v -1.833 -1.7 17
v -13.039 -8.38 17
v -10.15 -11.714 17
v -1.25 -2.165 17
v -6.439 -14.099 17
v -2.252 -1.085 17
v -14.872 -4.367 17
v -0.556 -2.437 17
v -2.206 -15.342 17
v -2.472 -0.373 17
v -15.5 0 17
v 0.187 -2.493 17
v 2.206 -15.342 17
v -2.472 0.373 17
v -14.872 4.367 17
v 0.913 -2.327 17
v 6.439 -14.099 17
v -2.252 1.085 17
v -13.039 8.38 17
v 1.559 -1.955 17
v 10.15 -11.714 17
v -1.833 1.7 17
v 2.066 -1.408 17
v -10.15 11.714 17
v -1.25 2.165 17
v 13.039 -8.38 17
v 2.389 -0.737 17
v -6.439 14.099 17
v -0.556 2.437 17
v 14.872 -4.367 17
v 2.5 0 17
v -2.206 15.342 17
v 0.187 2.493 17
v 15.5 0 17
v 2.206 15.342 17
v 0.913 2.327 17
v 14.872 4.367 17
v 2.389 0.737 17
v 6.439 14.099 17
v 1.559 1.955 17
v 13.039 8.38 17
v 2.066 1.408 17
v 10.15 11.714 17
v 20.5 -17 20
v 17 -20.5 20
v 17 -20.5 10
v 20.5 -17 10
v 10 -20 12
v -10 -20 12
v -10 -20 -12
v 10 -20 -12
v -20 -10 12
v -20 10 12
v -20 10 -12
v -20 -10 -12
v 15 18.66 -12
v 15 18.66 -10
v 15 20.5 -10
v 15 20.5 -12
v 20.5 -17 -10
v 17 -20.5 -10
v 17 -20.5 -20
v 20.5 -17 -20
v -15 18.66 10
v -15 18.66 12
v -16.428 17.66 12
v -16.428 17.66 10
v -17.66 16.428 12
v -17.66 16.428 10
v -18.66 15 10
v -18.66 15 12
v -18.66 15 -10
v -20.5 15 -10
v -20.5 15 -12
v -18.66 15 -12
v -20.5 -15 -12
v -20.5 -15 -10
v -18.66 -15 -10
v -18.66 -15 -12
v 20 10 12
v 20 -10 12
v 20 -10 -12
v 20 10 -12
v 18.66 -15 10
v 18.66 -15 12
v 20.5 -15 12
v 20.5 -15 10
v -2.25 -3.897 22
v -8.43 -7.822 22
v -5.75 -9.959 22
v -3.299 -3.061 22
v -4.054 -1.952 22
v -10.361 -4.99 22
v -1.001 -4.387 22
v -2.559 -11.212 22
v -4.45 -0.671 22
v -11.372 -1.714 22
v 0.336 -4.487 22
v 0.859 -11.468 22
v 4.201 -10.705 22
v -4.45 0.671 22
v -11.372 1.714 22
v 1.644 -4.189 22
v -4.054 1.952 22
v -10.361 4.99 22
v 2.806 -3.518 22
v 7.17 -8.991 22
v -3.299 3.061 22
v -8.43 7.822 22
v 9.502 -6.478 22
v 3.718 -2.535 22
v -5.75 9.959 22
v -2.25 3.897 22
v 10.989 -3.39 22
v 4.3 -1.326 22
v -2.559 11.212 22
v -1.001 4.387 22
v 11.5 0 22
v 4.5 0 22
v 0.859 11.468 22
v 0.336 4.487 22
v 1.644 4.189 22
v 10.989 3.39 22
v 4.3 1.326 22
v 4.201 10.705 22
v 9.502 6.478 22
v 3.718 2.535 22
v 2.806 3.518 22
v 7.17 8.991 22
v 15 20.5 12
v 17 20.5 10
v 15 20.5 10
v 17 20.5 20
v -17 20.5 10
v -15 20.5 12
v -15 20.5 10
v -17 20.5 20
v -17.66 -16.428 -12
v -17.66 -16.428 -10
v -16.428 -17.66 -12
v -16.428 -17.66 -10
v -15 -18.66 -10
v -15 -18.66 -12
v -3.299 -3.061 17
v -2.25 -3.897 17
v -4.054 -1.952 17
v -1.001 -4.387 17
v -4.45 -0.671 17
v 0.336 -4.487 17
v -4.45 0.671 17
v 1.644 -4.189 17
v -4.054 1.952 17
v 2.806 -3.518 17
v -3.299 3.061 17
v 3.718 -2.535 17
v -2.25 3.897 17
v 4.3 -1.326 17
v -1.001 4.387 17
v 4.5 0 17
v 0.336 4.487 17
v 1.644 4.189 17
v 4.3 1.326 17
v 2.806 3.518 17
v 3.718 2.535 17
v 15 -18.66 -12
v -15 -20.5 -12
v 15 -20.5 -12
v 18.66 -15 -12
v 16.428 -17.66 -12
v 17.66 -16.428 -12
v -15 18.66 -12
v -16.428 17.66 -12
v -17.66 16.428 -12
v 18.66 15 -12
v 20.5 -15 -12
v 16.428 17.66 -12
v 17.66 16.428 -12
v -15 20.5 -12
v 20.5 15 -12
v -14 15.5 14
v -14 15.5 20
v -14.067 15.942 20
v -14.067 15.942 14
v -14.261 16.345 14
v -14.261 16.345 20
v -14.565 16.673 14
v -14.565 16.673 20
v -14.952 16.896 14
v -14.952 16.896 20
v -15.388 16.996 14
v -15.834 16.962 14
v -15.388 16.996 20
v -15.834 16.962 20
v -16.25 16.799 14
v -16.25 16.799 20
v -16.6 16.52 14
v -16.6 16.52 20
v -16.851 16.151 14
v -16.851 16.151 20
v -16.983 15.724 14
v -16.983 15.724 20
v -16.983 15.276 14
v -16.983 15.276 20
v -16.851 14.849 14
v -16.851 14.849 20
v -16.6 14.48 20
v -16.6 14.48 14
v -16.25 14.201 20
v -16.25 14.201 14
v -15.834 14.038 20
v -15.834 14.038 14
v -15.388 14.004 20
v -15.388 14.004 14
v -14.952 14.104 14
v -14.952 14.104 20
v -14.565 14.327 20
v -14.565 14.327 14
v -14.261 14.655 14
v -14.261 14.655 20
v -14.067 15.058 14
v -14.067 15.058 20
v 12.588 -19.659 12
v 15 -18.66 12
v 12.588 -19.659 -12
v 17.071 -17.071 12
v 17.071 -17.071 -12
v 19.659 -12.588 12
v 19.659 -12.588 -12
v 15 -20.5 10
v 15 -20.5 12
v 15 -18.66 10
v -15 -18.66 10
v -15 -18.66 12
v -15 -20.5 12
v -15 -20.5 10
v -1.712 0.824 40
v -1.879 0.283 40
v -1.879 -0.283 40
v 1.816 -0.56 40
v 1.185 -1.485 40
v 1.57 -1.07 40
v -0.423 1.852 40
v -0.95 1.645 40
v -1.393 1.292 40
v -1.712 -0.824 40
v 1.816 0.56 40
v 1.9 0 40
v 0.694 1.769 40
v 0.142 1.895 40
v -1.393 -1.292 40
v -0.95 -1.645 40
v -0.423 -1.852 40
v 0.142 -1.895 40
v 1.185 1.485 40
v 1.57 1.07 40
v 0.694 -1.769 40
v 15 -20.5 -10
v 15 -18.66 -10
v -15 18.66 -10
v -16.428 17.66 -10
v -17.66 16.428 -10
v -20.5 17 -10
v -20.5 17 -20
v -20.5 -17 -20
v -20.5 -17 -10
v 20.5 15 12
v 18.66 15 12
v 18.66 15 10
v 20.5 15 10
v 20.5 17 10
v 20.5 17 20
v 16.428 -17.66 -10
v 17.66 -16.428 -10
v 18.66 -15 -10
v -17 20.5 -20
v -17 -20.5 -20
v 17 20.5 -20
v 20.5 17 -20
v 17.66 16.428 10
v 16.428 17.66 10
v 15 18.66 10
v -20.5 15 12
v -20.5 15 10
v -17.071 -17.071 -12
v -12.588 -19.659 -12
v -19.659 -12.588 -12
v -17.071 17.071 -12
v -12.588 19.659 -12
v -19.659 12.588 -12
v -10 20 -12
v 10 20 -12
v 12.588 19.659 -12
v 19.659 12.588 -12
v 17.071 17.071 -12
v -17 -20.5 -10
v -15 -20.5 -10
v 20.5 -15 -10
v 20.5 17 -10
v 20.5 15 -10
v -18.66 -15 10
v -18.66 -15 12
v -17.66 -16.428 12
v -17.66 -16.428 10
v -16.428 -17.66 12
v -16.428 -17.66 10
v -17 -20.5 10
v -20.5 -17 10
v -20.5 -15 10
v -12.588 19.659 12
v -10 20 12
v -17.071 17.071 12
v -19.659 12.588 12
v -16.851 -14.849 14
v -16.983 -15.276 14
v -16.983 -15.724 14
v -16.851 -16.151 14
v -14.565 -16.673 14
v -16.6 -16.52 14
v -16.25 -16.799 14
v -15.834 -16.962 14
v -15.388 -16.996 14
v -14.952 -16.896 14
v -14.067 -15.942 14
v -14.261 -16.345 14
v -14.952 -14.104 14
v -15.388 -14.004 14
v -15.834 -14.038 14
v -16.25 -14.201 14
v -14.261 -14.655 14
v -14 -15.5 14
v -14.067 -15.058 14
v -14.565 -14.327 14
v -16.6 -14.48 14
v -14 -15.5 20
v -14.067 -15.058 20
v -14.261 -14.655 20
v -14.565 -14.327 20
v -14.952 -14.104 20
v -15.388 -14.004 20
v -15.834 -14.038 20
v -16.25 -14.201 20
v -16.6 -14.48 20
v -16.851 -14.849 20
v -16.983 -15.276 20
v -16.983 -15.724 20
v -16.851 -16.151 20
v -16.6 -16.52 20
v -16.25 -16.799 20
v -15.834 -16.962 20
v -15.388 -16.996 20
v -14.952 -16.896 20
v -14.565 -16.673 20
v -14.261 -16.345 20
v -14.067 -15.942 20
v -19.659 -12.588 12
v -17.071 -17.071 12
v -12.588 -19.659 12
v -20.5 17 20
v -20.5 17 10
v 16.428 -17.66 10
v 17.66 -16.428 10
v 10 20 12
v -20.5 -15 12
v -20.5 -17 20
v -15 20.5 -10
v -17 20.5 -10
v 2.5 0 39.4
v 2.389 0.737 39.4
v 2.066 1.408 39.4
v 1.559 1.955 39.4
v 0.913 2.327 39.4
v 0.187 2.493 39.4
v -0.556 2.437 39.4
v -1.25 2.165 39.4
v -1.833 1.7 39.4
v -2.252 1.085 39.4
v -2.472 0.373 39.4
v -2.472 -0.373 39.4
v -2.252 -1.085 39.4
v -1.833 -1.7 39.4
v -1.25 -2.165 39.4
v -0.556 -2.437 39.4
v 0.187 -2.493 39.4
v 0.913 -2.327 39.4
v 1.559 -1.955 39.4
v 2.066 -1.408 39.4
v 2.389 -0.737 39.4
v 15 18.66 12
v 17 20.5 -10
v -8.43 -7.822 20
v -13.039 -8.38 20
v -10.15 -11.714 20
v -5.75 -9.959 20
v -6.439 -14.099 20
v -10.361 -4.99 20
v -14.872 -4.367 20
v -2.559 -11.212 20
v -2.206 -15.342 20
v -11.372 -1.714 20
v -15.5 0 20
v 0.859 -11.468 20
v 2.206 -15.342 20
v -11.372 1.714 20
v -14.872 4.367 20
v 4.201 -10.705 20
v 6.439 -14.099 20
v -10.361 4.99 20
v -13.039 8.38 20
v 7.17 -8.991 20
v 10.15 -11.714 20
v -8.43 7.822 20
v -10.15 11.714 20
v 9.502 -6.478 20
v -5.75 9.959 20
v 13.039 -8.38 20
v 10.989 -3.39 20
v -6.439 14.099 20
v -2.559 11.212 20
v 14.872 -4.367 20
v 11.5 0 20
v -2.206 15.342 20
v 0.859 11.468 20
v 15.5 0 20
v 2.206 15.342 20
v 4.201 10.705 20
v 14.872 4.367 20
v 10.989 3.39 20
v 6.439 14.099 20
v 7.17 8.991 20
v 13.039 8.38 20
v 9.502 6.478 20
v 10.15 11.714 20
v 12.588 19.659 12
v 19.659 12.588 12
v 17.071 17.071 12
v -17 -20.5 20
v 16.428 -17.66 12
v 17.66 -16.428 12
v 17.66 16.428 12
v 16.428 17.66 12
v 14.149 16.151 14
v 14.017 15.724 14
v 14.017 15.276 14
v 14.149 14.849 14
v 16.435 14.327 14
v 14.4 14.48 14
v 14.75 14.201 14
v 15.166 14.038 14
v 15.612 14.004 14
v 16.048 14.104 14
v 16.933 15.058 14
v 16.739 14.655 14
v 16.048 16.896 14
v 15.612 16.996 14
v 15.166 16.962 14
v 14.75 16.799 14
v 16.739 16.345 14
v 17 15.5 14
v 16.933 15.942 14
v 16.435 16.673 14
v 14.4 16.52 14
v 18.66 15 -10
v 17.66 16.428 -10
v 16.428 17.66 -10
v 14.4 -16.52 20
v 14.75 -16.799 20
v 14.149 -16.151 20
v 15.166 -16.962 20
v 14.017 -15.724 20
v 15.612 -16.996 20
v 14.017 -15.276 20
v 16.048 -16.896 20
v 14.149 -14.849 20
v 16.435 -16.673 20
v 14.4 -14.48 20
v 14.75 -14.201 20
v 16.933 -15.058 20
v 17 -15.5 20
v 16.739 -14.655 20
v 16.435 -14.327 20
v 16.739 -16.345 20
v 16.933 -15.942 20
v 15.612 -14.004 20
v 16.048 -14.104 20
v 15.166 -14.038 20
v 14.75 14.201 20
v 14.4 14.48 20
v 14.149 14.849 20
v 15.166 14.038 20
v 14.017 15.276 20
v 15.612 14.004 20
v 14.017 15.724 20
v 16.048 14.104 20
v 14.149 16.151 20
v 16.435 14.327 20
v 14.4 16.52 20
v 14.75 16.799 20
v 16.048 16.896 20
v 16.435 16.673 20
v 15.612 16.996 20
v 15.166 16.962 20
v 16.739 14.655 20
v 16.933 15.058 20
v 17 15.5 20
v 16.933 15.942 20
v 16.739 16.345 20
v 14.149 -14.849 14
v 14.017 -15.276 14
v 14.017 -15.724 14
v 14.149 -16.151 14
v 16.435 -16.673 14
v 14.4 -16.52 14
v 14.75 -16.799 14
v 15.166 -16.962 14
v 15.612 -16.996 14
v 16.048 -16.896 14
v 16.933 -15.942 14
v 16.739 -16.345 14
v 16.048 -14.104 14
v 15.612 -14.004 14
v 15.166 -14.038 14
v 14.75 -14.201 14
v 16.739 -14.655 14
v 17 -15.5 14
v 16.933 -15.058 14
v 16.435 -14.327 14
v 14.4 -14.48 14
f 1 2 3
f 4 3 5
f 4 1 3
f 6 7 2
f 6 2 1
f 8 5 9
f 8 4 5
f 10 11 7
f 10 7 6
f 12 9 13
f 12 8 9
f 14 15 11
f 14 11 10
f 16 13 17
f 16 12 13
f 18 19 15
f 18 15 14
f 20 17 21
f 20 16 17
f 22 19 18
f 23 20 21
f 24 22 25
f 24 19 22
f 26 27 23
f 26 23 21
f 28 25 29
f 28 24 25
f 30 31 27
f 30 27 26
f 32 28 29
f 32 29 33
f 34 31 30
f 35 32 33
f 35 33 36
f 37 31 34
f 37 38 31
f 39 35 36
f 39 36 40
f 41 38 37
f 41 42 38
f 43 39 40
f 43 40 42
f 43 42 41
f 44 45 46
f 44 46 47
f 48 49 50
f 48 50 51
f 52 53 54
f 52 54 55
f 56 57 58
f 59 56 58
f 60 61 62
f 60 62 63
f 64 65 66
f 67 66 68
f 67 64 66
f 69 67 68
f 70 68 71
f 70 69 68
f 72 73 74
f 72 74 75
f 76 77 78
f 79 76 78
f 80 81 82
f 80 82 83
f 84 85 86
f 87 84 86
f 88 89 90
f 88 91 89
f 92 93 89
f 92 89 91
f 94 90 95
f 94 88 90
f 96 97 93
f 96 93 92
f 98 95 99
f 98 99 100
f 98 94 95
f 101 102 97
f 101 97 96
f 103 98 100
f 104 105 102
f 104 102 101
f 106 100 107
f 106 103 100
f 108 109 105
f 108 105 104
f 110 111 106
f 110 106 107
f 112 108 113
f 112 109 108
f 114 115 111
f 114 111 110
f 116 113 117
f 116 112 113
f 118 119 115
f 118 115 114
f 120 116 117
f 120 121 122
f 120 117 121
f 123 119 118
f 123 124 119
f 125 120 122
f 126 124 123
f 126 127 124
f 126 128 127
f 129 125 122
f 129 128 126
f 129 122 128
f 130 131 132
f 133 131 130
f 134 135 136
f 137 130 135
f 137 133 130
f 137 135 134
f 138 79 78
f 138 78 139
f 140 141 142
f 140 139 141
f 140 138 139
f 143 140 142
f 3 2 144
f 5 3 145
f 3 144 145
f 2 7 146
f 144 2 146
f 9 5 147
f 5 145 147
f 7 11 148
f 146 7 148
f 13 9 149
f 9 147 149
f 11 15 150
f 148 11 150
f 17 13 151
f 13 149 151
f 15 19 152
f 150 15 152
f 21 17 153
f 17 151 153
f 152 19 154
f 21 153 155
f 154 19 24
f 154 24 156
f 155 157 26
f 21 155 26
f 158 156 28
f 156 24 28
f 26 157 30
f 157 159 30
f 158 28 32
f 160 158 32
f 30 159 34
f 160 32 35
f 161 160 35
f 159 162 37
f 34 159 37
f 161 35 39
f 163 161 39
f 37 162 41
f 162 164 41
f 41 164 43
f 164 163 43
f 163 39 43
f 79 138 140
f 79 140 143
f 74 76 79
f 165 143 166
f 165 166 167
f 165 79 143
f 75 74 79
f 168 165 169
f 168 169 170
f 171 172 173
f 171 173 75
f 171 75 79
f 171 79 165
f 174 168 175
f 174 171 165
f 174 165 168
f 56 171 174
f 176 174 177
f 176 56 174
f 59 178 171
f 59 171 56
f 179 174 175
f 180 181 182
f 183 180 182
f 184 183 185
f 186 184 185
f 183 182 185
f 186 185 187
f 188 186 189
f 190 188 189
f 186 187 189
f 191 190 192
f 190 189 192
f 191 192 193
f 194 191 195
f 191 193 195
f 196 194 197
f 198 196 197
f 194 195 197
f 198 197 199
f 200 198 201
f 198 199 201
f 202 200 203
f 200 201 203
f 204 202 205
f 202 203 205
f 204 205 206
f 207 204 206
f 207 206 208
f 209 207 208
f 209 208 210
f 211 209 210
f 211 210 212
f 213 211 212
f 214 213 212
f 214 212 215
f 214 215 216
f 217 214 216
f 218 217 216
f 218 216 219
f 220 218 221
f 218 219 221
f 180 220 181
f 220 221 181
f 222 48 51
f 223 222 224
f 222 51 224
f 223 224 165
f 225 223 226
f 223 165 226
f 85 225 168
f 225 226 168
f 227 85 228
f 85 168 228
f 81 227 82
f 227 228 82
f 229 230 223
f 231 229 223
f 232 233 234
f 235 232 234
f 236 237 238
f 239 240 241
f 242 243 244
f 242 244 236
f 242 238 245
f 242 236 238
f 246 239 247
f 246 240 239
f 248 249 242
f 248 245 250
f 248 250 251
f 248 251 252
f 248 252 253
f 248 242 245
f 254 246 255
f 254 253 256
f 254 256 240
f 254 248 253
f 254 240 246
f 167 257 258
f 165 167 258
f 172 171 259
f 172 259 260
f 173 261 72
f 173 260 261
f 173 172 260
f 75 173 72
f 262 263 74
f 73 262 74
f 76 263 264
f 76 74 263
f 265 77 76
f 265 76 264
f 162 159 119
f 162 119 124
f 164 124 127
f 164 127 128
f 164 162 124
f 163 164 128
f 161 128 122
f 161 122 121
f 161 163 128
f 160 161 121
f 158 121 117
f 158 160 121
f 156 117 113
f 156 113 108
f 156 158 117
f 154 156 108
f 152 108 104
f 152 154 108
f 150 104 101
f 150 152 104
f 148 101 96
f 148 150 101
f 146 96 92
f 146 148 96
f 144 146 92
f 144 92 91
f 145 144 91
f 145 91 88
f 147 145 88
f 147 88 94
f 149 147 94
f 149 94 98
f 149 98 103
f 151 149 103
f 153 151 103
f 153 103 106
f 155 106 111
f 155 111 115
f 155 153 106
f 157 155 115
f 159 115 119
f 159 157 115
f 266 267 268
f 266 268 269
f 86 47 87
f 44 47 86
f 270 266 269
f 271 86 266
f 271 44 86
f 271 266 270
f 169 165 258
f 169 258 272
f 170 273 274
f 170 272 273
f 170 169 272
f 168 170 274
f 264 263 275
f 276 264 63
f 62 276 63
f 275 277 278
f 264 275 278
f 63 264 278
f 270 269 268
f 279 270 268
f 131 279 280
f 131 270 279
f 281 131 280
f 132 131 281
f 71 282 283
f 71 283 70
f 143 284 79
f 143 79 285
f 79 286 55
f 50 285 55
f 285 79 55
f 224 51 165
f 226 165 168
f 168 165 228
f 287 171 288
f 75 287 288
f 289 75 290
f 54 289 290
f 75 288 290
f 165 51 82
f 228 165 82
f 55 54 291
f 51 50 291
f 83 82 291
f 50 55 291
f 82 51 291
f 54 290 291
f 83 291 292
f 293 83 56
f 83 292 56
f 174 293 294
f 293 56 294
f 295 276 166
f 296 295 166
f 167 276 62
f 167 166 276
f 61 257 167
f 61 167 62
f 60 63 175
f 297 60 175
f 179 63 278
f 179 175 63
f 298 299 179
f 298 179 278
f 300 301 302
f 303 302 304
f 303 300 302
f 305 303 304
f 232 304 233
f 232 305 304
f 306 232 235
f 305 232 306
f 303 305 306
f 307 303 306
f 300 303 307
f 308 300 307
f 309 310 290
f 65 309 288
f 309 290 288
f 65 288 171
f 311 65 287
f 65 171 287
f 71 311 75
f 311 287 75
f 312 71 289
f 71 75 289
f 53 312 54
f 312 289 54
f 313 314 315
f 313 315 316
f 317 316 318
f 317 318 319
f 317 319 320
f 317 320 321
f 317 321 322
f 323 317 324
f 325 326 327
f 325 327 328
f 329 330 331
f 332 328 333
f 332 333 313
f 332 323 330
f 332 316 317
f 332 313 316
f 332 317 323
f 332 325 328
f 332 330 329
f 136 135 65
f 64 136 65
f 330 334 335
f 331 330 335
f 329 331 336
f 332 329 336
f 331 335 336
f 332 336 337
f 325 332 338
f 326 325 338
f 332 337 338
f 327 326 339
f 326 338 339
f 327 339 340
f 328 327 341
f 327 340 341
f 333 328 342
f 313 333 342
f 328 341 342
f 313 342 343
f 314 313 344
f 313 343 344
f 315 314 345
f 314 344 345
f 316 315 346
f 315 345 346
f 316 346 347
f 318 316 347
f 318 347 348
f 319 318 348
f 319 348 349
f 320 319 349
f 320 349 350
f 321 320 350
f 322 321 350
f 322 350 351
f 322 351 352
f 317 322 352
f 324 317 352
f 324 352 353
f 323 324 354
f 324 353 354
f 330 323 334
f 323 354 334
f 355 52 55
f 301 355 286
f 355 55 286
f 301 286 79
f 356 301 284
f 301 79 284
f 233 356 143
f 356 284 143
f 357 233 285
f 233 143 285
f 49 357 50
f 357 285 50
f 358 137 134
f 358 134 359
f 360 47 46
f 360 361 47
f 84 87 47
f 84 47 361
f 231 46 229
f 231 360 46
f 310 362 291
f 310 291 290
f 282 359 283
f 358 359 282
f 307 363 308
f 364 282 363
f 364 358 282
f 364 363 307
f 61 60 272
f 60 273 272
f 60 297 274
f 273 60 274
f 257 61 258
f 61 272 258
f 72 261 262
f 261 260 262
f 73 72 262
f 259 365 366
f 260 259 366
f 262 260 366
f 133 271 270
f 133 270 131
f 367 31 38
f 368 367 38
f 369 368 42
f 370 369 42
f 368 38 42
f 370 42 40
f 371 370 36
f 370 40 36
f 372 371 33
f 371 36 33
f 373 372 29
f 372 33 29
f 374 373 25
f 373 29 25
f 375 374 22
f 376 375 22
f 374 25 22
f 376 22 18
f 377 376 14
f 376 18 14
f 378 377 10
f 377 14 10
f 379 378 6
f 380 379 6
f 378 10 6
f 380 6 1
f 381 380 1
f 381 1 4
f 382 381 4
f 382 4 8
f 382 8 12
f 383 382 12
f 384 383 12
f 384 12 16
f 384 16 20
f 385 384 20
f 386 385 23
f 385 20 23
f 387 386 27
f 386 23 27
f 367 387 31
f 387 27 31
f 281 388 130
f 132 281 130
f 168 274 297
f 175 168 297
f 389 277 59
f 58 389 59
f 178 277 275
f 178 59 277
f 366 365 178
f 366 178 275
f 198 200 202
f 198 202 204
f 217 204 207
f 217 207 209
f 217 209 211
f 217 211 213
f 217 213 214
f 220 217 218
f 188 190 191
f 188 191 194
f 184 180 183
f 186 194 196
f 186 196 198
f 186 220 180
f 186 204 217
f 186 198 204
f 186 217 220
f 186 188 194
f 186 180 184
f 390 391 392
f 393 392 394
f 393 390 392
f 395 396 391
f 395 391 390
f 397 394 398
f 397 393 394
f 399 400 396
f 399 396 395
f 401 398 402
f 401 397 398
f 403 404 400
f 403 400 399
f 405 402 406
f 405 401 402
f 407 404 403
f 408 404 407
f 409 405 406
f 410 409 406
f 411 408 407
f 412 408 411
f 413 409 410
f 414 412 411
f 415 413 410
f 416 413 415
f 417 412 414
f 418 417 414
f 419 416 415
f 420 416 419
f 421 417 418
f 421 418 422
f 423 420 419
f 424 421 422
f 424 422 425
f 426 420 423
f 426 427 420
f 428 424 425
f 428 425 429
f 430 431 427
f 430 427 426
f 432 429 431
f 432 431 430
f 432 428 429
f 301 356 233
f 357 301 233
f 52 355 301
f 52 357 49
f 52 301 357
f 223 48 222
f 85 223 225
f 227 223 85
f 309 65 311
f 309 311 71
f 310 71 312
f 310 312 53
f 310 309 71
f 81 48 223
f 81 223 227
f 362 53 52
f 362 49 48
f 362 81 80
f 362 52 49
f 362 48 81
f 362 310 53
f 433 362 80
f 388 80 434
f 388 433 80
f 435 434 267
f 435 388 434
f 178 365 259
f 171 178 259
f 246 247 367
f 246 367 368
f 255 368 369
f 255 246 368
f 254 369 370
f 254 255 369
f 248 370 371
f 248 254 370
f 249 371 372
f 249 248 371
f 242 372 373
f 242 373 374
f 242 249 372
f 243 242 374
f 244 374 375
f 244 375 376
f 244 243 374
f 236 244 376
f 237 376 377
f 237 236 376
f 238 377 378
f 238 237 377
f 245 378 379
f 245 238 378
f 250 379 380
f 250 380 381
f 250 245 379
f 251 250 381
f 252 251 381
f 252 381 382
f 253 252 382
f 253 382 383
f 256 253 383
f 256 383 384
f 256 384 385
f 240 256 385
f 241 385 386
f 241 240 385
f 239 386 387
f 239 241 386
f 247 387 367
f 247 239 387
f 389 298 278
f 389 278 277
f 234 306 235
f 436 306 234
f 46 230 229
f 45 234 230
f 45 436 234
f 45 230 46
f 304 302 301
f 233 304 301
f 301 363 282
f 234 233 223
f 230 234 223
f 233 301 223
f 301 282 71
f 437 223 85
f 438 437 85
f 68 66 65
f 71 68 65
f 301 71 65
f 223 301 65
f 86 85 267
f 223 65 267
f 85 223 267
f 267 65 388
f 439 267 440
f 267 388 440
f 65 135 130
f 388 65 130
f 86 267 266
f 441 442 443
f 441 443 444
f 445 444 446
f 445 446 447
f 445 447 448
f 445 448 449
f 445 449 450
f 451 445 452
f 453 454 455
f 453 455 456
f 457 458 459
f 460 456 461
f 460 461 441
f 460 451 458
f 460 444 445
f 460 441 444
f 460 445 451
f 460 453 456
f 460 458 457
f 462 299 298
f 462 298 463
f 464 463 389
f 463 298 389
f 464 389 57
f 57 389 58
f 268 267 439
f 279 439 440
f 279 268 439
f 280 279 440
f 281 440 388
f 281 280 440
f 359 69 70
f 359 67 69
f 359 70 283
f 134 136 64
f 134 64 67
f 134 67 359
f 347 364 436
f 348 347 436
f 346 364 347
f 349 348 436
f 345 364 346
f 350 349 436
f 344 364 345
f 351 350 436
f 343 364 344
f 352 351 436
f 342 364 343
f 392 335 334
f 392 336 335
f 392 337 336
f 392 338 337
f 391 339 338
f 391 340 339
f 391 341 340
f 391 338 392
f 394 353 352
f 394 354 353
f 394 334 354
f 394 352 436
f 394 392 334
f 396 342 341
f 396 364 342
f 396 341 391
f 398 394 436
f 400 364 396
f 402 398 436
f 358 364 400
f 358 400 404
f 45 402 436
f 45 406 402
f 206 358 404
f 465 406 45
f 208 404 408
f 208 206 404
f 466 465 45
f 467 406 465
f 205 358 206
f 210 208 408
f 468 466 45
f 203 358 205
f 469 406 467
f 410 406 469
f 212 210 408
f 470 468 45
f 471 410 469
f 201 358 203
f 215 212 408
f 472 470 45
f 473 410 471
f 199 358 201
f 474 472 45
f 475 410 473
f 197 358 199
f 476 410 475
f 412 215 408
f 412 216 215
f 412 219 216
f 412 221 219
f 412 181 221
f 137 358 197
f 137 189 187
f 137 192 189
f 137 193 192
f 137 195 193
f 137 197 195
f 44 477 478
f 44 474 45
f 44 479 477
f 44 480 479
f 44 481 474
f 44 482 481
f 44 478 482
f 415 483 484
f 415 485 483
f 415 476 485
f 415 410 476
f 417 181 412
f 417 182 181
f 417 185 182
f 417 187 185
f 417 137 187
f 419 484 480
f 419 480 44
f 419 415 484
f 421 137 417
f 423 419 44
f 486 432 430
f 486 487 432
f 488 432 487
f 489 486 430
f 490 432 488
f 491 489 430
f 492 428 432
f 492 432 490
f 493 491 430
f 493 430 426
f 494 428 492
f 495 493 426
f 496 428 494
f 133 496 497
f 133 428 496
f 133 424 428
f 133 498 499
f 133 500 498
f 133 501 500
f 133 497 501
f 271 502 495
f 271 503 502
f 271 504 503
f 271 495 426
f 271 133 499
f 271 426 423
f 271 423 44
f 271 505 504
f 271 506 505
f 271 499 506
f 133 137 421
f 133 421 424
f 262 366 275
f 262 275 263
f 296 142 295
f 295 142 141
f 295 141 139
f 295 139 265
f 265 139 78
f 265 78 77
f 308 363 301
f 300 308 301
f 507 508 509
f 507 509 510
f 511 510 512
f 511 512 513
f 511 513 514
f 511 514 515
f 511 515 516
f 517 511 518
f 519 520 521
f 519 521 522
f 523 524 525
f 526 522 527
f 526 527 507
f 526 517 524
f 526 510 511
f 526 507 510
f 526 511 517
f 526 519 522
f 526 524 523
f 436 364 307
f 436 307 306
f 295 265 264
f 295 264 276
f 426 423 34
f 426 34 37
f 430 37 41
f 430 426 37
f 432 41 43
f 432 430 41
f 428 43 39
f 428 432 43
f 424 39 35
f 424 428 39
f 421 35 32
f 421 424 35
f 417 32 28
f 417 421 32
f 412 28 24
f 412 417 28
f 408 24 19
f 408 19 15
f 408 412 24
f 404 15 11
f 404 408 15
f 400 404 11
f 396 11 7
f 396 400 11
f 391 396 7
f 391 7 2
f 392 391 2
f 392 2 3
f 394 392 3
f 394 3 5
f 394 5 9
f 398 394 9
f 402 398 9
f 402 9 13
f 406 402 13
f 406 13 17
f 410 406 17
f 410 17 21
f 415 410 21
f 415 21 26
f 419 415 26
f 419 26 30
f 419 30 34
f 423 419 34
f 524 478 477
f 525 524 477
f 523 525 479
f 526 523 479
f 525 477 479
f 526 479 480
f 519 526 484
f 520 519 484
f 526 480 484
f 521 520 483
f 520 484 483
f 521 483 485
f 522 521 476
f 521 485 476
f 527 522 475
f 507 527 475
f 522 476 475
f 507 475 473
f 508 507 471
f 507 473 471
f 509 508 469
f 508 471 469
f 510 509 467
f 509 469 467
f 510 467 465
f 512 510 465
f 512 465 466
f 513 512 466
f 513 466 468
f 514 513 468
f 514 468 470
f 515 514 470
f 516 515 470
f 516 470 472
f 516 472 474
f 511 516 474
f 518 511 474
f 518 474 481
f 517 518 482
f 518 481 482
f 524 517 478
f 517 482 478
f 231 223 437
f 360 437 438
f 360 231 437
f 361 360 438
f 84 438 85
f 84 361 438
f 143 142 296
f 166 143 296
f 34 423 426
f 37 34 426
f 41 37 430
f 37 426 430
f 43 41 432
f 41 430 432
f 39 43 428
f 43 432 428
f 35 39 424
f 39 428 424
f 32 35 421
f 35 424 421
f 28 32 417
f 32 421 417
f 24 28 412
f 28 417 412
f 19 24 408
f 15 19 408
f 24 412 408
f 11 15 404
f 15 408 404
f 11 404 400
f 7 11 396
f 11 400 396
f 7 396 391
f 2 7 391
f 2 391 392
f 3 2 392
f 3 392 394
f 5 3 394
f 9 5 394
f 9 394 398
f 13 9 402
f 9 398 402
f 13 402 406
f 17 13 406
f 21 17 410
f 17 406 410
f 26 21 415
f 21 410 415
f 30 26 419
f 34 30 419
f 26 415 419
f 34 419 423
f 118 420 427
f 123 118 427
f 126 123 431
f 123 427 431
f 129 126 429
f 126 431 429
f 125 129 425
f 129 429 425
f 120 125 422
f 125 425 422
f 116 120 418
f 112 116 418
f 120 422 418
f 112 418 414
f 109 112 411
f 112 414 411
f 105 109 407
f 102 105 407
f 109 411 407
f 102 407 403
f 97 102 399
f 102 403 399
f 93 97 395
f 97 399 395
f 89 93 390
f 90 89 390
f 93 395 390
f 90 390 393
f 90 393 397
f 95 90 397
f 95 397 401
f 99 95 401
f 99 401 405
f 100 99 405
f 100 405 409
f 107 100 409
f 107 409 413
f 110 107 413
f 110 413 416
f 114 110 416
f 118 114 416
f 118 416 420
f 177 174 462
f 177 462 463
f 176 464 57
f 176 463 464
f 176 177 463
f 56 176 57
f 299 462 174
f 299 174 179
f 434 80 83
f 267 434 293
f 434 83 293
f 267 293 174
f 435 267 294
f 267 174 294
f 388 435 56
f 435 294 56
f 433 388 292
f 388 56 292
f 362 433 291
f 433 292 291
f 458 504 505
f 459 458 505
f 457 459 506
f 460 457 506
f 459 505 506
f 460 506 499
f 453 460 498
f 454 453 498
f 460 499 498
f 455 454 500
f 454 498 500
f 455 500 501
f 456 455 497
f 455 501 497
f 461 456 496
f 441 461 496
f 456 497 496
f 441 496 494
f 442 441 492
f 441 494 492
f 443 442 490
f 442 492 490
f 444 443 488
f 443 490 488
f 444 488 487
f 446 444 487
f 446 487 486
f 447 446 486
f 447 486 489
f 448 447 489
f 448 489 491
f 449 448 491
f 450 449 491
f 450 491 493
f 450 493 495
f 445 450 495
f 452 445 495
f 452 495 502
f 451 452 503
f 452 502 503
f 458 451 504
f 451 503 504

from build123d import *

# Parameters (mm, degrees)
SALIENTE_EXTRUIR1_DEPTH = 20
CORTAR_EXTRUIR1_START   = -8
CROQUIS2_W              = 30
CROQUIS2_H              = 5.5
CROQUIS2_H_2            = 30
CROQUIS2_W_2            = 5.5
CORTAR_EXTRUIR1_DEPTH   = 24
CORTAR_EXTRUIR2_START   = -10
CORTAR_EXTRUIR2_DEPTH   = 20
CORTAR_EXTRUIR3_START   = -32
CORTAR_EXTRUIR3_DEPTH   = 24
SALIENTE_EXTRUIR2_START = -32
SALIENTE_EXTRUIR2_DEPTH = 24
CROQUIS5_R              = 15.5
CROQUIS5_R_2            = 11.5
CROQUIS5_R_3            = 4.5
CROQUIS5_R_4            = 2.5
CORTAR_EXTRUIR4_DEPTH   = 3
SALIENTE_EXTRUIR3_REACH = 51.401
CROQUIS5_3_R            = 15.5
CROQUIS5_3_R_2          = 11.5
SALIENTE_EXTRUIR4_START = -3
CROQUIS5_4_R            = 11.5
CROQUIS5_4_R_2          = 4.5
SALIENTE_EXTRUIR4_DEPTH = 5
SALIENTE_EXTRUIR5_START = -3
CROQUIS5_5_R            = 2.5
SALIENTE_EXTRUIR5_DEPTH = 23
CHAFL_N1_SIZE           = 0.6
CROQUIS6_R              = 1.5
CORTAR_EXTRUIR5_DEPTH   = 6


with BuildPart() as part:
    # Croquis1 → Saliente-Extruir1 (new, symmetric)
    with BuildSketch(Plane.XY):
        Polygon((-17, 20.5), (-20.5, 17), (-20.5, -17), (-17, -20.5), (17, -20.5), (20.5, -17), (20.5, 17), (17, 20.5), align=None)
    extrude(amount=SALIENTE_EXTRUIR1_DEPTH, both=True)

    # Croquis2 → Cortar-Extruir1 (cut)
    with BuildSketch(Plane.XY.offset(20).offset(CORTAR_EXTRUIR1_START)):
        with Locations((0, 17.75)):
            Rectangle(CROQUIS2_W, CROQUIS2_H)
        Rectangle(CROQUIS2_W, CROQUIS2_H_2)
        with Locations((17.75, 0)):
            Rectangle(CROQUIS2_W_2, CROQUIS2_H_2)
        with Locations((0, -17.75)):
            Rectangle(CROQUIS2_W, CROQUIS2_H)
        with Locations((-17.75, 0)):
            Rectangle(CROQUIS2_W_2, CROQUIS2_H_2)
    extrude(amount=-CORTAR_EXTRUIR1_DEPTH, mode=Mode.SUBTRACT)

    # Croquis3 → Cortar-Extruir2 (cut)
    with BuildSketch(Plane(origin=(0, 0, -20), x_dir=(-1, 0, 0), z_dir=(0, 0, -1)).offset(CORTAR_EXTRUIR2_START)):
        Polygon((-17, 20.5), (-20.5, 17), (-20.5, -17), (-17, -20.5), (17, -20.5), (20.5, -17), (20.5, 17), (17, 20.5), align=None)
    extrude(amount=-CORTAR_EXTRUIR2_DEPTH, mode=Mode.SUBTRACT)


with BuildPart() as cortar_extruir2_piece_1:
    # of the separate pieces the step leaves, piece 1, a body of its own (cortar_extruir2_pieces)
    add(part.part.solids().sort_by_distance((-17, 20.5, -10))[0])


with BuildPart() as cortar_extruir2_piece_2:
    # of the separate pieces the step leaves, piece 2, a body of its own (cortar_extruir2_pieces)
    add(part.part.solids().sort_by_distance((-17, 20.5, 20))[0])


with BuildPart() as cortar_extruir3_tool:
    # Croquis4<4> → Cortar-Extruir3 (new body)
    with BuildSketch(Plane.XY.offset(20).offset(CORTAR_EXTRUIR3_START)):
        with BuildLine():
            Line((-20, 10), (-20, -10))
            ThreePointArc((-20, -10), (-17.071067812, -17.071067812), (-10, -20))
            Line((-10, -20), (10, -20))
            ThreePointArc((10, -20), (17.071067812, -17.071067812), (20, -10))
            Line((20, -10), (20, 10))
            ThreePointArc((20, 10), (17.071067812, 17.071067812), (10, 20))
            Line((10, 20), (-10, 20))
            ThreePointArc((-10, 20), (-17.071067812, 17.071067812), (-20, 10))
        make_face()
    extrude(amount=CORTAR_EXTRUIR3_DEPTH)


with BuildPart() as cortar_extruir2_piece_1_1:
    add(cortar_extruir2_piece_1.part)

    # Cortar-Extruir3: cut by cortar_extruir3_tool
    add(cortar_extruir3_tool.part, mode=Mode.SUBTRACT)


with BuildPart() as cortar_extruir2_piece_2_1:
    add(cortar_extruir2_piece_2.part)

    # Cortar-Extruir3: cut by cortar_extruir3_tool
    add(cortar_extruir3_tool.part, mode=Mode.SUBTRACT)

    # Croquis5 → Cortar-Extruir4 (cut)
    # profile 1 of 4: a face of its own
    with BuildSketch(Plane.XY.offset(20)):
        Circle(CROQUIS5_R)
        Circle(CROQUIS5_R_2, mode=Mode.SUBTRACT)
    # profile 2 of 4: a face of its own
    with BuildSketch(Plane.XY.offset(20)):
        Circle(CROQUIS5_R_2)
        Circle(CROQUIS5_R_3, mode=Mode.SUBTRACT)
    # profile 3 of 4: a face of its own
    with BuildSketch(Plane.XY.offset(20)):
        Circle(CROQUIS5_R_3)
        Circle(CROQUIS5_R_4, mode=Mode.SUBTRACT)
    # profile 4 of 4: a face of its own
    with BuildSketch(Plane.XY.offset(20)):
        Circle(CROQUIS5_R_4)
    extrude(amount=-CORTAR_EXTRUIR4_DEPTH, mode=Mode.SUBTRACT)


with BuildPart() as body_3:
    # Croquis4 → Saliente-Extruir2 (new body)
    with BuildSketch(Plane.XY.offset(20).offset(SALIENTE_EXTRUIR2_START)):
        with BuildLine():
            Line((-20, 10), (-20, -10))
            ThreePointArc((-20, -10), (-17.071067812, -17.071067812), (-10, -20))
            Line((-10, -20), (10, -20))
            ThreePointArc((10, -20), (17.071067812, -17.071067812), (20, -10))
            Line((20, -10), (20, 10))
            ThreePointArc((20, 10), (17.071067812, 17.071067812), (10, 20))
            Line((10, 20), (-10, 20))
            ThreePointArc((-10, 20), (-17.071067812, 17.071067812), (-20, 10))
        make_face()
    extrude(amount=SALIENTE_EXTRUIR2_DEPTH)


with BuildPart() as body_4:

    # Croquis5<3> → Saliente-Extruir3 (new, up to next)
    with BuildSketch(Plane.XY.offset(20), mode=Mode.PRIVATE) as saliente_extruir3_sk1:
        Circle(CROQUIS5_3_R)
        Circle(CROQUIS5_3_R_2, mode=Mode.SUBTRACT)
    saliente_extruir3_tool1 = extrude(saliente_extruir3_sk1.sketch, amount=-SALIENTE_EXTRUIR3_REACH, mode=Mode.PRIVATE) - cortar_extruir2_piece_2_1.part
    add(saliente_extruir3_tool1.solids().sort_by_distance((-15.061594, 0, 20))[0])

    # Croquis5<4> → Saliente-Extruir4 (add)
    with BuildSketch(Plane.XY.offset(20).offset(SALIENTE_EXTRUIR4_START)):
        Circle(CROQUIS5_4_R)
        Circle(CROQUIS5_4_R_2, mode=Mode.SUBTRACT)
    extrude(amount=SALIENTE_EXTRUIR4_DEPTH)


with BuildPart() as cortar_extruir2_piece_2_2:
    add(cortar_extruir2_piece_2_1.part)

    # Croquis5<5> → Saliente-Extruir5 (add)
    with BuildSketch(Plane.XY.offset(20).offset(SALIENTE_EXTRUIR5_START)):
        Circle(CROQUIS5_5_R)
    extrude(amount=SALIENTE_EXTRUIR5_DEPTH)

    # Chaflán1
    chafl_n1_edges = [cortar_extruir2_piece_2_2.edges().sort_by_distance(p)[0] for p in [
        (-2.5, 0, 40),
    ]]
    chamfer(chafl_n1_edges, length=CHAFL_N1_SIZE)

    # Croquis6 → Cortar-Extruir5 (cut)
    with BuildSketch(Plane.XY.offset(20)):
        with Locations((-15.5, -15.5)):
            Circle(CROQUIS6_R)
        with Locations((15.5, -15.5)):
            Circle(CROQUIS6_R)
        with Locations((15.5, 15.5)):
            Circle(CROQUIS6_R)
        with Locations((-15.5, 15.5)):
            Circle(CROQUIS6_R)
    extrude(amount=-CORTAR_EXTRUIR5_DEPTH, mode=Mode.SUBTRACT)


solid = Compound([cortar_extruir2_piece_1_1.part, body_3.part, body_4.part, cortar_extruir2_piece_2_2.part])
